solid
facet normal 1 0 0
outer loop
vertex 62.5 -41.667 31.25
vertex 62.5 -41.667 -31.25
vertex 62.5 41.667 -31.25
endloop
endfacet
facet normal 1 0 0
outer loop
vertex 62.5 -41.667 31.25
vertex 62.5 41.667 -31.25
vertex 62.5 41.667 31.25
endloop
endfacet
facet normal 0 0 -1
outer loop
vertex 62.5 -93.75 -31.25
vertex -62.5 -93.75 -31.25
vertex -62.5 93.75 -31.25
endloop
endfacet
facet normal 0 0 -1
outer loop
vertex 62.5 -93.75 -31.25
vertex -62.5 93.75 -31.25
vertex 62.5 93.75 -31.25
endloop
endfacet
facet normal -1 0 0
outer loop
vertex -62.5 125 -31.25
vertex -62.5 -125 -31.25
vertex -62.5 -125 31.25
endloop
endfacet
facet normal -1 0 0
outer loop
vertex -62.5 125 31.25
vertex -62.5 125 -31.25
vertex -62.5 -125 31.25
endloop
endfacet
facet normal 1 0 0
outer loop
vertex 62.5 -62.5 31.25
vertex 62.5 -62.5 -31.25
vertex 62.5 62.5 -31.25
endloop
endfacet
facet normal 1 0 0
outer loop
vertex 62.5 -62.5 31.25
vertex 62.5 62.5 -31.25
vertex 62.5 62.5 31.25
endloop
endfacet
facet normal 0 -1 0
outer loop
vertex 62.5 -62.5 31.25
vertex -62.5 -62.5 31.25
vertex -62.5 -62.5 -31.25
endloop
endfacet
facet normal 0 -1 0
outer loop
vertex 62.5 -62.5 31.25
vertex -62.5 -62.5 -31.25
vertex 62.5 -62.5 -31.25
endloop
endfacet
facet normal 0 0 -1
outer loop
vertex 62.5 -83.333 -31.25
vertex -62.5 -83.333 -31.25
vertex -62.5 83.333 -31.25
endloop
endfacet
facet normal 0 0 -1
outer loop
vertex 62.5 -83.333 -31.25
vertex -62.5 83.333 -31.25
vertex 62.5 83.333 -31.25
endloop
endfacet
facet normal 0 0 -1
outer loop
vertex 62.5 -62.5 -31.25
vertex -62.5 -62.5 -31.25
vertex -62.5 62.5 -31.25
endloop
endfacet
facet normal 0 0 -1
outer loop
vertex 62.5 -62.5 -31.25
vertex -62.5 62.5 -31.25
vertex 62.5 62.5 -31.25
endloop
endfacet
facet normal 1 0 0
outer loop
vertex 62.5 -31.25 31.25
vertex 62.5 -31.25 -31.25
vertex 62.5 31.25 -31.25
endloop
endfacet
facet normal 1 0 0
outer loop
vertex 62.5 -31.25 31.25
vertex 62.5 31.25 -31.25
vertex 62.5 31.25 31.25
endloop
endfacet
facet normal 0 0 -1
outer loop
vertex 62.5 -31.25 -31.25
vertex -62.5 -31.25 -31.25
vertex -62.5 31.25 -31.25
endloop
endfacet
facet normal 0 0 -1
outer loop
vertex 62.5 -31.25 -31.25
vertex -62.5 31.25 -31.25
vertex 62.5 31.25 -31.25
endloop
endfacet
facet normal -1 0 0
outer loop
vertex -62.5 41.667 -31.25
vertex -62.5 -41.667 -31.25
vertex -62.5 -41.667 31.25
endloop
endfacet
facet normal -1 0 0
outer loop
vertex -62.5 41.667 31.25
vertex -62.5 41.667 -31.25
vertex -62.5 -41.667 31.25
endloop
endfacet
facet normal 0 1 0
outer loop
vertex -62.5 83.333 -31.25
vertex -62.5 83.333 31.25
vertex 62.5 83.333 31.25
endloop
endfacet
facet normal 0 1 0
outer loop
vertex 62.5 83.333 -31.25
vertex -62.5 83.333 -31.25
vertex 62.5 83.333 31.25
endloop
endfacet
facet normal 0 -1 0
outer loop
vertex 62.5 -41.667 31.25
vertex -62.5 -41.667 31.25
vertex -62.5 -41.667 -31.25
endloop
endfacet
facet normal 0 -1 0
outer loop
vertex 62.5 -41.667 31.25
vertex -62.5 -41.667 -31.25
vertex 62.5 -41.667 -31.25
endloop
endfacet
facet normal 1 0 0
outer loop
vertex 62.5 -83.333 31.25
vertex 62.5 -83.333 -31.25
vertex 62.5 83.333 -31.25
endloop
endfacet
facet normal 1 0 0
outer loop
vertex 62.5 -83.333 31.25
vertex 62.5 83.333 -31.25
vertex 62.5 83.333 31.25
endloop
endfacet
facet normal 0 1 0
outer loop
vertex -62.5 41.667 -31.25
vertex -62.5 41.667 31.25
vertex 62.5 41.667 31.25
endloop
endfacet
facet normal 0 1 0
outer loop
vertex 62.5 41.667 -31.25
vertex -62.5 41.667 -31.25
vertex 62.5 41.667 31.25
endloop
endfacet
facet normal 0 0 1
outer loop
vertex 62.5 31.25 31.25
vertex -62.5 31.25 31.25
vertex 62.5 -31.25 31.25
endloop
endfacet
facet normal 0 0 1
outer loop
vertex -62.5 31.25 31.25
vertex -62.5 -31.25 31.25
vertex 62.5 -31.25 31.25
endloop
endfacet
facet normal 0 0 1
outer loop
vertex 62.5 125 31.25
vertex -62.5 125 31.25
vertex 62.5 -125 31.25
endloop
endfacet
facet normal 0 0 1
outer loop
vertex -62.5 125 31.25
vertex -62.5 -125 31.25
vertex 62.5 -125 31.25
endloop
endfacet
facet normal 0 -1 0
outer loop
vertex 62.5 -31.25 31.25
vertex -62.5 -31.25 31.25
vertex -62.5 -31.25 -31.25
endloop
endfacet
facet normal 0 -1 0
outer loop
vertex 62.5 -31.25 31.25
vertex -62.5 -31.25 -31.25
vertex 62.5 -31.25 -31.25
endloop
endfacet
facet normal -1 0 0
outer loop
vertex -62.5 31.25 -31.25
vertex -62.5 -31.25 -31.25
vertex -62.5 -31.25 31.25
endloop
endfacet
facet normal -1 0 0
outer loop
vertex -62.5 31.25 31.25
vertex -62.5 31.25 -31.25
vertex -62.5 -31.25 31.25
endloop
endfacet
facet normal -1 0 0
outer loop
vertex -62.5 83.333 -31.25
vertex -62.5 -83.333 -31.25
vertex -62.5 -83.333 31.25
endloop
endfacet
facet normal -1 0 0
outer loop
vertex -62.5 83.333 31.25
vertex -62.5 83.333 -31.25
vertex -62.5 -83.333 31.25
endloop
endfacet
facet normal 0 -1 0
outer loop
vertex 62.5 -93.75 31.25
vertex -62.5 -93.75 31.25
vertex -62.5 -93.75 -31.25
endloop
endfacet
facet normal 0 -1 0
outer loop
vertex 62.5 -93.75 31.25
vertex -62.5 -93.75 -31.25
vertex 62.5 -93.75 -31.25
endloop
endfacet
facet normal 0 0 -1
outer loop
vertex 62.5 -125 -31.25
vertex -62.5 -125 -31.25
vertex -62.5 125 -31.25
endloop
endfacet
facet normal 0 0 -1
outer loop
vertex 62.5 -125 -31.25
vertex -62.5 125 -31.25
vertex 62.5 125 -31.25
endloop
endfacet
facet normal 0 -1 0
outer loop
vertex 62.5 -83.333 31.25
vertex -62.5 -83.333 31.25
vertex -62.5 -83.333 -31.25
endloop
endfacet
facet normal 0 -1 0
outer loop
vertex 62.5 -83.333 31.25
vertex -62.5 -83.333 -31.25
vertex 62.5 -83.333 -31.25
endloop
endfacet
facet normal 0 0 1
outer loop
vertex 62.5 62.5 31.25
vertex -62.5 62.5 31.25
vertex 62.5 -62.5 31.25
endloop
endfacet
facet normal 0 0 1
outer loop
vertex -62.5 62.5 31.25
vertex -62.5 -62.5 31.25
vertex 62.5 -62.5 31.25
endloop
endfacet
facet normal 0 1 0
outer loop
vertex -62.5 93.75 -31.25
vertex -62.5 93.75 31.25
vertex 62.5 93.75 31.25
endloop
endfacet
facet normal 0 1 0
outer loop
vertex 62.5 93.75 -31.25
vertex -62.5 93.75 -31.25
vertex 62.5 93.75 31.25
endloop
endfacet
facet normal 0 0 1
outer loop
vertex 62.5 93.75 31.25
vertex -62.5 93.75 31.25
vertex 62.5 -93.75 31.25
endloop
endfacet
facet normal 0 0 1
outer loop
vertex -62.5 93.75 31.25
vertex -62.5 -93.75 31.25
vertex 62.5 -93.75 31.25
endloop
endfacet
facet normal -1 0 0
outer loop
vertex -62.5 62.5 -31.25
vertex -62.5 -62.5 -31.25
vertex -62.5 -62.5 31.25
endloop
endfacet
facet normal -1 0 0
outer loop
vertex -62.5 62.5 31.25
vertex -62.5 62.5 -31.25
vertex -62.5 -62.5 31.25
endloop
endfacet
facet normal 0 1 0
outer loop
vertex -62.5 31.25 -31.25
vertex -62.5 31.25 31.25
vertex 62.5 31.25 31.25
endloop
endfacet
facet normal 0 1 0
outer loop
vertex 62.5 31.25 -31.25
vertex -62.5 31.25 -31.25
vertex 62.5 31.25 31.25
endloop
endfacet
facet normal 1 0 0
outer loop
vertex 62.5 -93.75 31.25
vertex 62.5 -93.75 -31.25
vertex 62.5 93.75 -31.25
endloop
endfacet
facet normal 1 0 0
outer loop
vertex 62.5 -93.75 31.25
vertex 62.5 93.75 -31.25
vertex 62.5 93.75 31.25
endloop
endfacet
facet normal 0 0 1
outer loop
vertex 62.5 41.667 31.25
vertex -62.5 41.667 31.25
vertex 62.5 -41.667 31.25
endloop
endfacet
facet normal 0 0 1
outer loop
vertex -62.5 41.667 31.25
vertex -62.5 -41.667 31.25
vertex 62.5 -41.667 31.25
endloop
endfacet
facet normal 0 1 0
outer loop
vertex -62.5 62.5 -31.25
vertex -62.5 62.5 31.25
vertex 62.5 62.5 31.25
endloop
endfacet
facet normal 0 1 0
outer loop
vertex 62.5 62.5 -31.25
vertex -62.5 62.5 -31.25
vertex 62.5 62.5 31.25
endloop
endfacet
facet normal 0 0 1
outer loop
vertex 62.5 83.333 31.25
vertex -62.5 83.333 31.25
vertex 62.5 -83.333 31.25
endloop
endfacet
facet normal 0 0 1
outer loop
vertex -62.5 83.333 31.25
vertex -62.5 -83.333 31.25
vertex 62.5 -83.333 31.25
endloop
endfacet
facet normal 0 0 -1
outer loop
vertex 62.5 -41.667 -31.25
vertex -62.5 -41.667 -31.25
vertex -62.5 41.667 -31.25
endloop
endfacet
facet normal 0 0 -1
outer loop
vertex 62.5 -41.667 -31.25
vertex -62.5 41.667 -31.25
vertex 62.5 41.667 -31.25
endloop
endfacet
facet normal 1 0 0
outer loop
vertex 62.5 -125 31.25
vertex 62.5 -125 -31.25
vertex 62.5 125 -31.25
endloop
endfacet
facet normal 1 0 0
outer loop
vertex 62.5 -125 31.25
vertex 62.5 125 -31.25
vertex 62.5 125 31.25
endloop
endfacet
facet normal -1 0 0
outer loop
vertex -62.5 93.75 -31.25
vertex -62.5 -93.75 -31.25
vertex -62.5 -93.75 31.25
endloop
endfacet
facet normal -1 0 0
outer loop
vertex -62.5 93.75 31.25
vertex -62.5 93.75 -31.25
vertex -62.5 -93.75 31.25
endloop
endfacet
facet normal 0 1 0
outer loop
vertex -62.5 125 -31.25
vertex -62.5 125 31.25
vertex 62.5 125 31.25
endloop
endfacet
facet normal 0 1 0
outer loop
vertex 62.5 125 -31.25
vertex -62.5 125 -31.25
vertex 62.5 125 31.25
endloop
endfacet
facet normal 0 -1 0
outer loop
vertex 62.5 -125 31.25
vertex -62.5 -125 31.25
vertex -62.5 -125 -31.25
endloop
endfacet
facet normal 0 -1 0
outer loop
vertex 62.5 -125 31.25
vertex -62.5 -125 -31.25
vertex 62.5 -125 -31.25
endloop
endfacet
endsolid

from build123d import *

# Parameters (mm, degrees)
F0_W     = 125
F0_H     = 62.5
F1_DEPTH = 125
F2_DEPTH = 62.5
F3_DEPTH = 93.75
F4_DEPTH = 31.25
F5_DEPTH = 83.333333
F6_DEPTH = 41.666667


with BuildPart() as f1:
    # F0 (on Front) → F1 (new body, symmetric)
    with BuildSketch(Plane.XZ):
        Rectangle(F0_W, F0_H)
    extrude(amount=F1_DEPTH, both=True)


with BuildPart() as f2:
    # F0 (on Front) → F2 (new body, symmetric)
    with BuildSketch(Plane.XZ):
        Rectangle(F0_W, F0_H)
    extrude(amount=F2_DEPTH, both=True)


with BuildPart() as f3:
    # F0 (on Front) → F3 (new body, symmetric)
    with BuildSketch(Plane.XZ):
        Rectangle(F0_W, F0_H)
    extrude(amount=F3_DEPTH, both=True)


with BuildPart() as f4:
    # F0 (on Front) → F4 (new body, symmetric)
    with BuildSketch(Plane.XZ):
        Rectangle(F0_W, F0_H)
    extrude(amount=F4_DEPTH, both=True)


with BuildPart() as f5:
    # F0 (on Front) → F5 (new body, symmetric)
    with BuildSketch(Plane.XZ):
        Rectangle(F0_W, F0_H)
    extrude(amount=F5_DEPTH, both=True)


with BuildPart() as f6:
    # F0 (on Front) → F6 (new body, symmetric)
    with BuildSketch(Plane.XZ):
        Rectangle(F0_W, F0_H)
    extrude(amount=F6_DEPTH, both=True)


solid = Compound([f1.part, f2.part, f3.part, f4.part, f5.part, f6.part])
